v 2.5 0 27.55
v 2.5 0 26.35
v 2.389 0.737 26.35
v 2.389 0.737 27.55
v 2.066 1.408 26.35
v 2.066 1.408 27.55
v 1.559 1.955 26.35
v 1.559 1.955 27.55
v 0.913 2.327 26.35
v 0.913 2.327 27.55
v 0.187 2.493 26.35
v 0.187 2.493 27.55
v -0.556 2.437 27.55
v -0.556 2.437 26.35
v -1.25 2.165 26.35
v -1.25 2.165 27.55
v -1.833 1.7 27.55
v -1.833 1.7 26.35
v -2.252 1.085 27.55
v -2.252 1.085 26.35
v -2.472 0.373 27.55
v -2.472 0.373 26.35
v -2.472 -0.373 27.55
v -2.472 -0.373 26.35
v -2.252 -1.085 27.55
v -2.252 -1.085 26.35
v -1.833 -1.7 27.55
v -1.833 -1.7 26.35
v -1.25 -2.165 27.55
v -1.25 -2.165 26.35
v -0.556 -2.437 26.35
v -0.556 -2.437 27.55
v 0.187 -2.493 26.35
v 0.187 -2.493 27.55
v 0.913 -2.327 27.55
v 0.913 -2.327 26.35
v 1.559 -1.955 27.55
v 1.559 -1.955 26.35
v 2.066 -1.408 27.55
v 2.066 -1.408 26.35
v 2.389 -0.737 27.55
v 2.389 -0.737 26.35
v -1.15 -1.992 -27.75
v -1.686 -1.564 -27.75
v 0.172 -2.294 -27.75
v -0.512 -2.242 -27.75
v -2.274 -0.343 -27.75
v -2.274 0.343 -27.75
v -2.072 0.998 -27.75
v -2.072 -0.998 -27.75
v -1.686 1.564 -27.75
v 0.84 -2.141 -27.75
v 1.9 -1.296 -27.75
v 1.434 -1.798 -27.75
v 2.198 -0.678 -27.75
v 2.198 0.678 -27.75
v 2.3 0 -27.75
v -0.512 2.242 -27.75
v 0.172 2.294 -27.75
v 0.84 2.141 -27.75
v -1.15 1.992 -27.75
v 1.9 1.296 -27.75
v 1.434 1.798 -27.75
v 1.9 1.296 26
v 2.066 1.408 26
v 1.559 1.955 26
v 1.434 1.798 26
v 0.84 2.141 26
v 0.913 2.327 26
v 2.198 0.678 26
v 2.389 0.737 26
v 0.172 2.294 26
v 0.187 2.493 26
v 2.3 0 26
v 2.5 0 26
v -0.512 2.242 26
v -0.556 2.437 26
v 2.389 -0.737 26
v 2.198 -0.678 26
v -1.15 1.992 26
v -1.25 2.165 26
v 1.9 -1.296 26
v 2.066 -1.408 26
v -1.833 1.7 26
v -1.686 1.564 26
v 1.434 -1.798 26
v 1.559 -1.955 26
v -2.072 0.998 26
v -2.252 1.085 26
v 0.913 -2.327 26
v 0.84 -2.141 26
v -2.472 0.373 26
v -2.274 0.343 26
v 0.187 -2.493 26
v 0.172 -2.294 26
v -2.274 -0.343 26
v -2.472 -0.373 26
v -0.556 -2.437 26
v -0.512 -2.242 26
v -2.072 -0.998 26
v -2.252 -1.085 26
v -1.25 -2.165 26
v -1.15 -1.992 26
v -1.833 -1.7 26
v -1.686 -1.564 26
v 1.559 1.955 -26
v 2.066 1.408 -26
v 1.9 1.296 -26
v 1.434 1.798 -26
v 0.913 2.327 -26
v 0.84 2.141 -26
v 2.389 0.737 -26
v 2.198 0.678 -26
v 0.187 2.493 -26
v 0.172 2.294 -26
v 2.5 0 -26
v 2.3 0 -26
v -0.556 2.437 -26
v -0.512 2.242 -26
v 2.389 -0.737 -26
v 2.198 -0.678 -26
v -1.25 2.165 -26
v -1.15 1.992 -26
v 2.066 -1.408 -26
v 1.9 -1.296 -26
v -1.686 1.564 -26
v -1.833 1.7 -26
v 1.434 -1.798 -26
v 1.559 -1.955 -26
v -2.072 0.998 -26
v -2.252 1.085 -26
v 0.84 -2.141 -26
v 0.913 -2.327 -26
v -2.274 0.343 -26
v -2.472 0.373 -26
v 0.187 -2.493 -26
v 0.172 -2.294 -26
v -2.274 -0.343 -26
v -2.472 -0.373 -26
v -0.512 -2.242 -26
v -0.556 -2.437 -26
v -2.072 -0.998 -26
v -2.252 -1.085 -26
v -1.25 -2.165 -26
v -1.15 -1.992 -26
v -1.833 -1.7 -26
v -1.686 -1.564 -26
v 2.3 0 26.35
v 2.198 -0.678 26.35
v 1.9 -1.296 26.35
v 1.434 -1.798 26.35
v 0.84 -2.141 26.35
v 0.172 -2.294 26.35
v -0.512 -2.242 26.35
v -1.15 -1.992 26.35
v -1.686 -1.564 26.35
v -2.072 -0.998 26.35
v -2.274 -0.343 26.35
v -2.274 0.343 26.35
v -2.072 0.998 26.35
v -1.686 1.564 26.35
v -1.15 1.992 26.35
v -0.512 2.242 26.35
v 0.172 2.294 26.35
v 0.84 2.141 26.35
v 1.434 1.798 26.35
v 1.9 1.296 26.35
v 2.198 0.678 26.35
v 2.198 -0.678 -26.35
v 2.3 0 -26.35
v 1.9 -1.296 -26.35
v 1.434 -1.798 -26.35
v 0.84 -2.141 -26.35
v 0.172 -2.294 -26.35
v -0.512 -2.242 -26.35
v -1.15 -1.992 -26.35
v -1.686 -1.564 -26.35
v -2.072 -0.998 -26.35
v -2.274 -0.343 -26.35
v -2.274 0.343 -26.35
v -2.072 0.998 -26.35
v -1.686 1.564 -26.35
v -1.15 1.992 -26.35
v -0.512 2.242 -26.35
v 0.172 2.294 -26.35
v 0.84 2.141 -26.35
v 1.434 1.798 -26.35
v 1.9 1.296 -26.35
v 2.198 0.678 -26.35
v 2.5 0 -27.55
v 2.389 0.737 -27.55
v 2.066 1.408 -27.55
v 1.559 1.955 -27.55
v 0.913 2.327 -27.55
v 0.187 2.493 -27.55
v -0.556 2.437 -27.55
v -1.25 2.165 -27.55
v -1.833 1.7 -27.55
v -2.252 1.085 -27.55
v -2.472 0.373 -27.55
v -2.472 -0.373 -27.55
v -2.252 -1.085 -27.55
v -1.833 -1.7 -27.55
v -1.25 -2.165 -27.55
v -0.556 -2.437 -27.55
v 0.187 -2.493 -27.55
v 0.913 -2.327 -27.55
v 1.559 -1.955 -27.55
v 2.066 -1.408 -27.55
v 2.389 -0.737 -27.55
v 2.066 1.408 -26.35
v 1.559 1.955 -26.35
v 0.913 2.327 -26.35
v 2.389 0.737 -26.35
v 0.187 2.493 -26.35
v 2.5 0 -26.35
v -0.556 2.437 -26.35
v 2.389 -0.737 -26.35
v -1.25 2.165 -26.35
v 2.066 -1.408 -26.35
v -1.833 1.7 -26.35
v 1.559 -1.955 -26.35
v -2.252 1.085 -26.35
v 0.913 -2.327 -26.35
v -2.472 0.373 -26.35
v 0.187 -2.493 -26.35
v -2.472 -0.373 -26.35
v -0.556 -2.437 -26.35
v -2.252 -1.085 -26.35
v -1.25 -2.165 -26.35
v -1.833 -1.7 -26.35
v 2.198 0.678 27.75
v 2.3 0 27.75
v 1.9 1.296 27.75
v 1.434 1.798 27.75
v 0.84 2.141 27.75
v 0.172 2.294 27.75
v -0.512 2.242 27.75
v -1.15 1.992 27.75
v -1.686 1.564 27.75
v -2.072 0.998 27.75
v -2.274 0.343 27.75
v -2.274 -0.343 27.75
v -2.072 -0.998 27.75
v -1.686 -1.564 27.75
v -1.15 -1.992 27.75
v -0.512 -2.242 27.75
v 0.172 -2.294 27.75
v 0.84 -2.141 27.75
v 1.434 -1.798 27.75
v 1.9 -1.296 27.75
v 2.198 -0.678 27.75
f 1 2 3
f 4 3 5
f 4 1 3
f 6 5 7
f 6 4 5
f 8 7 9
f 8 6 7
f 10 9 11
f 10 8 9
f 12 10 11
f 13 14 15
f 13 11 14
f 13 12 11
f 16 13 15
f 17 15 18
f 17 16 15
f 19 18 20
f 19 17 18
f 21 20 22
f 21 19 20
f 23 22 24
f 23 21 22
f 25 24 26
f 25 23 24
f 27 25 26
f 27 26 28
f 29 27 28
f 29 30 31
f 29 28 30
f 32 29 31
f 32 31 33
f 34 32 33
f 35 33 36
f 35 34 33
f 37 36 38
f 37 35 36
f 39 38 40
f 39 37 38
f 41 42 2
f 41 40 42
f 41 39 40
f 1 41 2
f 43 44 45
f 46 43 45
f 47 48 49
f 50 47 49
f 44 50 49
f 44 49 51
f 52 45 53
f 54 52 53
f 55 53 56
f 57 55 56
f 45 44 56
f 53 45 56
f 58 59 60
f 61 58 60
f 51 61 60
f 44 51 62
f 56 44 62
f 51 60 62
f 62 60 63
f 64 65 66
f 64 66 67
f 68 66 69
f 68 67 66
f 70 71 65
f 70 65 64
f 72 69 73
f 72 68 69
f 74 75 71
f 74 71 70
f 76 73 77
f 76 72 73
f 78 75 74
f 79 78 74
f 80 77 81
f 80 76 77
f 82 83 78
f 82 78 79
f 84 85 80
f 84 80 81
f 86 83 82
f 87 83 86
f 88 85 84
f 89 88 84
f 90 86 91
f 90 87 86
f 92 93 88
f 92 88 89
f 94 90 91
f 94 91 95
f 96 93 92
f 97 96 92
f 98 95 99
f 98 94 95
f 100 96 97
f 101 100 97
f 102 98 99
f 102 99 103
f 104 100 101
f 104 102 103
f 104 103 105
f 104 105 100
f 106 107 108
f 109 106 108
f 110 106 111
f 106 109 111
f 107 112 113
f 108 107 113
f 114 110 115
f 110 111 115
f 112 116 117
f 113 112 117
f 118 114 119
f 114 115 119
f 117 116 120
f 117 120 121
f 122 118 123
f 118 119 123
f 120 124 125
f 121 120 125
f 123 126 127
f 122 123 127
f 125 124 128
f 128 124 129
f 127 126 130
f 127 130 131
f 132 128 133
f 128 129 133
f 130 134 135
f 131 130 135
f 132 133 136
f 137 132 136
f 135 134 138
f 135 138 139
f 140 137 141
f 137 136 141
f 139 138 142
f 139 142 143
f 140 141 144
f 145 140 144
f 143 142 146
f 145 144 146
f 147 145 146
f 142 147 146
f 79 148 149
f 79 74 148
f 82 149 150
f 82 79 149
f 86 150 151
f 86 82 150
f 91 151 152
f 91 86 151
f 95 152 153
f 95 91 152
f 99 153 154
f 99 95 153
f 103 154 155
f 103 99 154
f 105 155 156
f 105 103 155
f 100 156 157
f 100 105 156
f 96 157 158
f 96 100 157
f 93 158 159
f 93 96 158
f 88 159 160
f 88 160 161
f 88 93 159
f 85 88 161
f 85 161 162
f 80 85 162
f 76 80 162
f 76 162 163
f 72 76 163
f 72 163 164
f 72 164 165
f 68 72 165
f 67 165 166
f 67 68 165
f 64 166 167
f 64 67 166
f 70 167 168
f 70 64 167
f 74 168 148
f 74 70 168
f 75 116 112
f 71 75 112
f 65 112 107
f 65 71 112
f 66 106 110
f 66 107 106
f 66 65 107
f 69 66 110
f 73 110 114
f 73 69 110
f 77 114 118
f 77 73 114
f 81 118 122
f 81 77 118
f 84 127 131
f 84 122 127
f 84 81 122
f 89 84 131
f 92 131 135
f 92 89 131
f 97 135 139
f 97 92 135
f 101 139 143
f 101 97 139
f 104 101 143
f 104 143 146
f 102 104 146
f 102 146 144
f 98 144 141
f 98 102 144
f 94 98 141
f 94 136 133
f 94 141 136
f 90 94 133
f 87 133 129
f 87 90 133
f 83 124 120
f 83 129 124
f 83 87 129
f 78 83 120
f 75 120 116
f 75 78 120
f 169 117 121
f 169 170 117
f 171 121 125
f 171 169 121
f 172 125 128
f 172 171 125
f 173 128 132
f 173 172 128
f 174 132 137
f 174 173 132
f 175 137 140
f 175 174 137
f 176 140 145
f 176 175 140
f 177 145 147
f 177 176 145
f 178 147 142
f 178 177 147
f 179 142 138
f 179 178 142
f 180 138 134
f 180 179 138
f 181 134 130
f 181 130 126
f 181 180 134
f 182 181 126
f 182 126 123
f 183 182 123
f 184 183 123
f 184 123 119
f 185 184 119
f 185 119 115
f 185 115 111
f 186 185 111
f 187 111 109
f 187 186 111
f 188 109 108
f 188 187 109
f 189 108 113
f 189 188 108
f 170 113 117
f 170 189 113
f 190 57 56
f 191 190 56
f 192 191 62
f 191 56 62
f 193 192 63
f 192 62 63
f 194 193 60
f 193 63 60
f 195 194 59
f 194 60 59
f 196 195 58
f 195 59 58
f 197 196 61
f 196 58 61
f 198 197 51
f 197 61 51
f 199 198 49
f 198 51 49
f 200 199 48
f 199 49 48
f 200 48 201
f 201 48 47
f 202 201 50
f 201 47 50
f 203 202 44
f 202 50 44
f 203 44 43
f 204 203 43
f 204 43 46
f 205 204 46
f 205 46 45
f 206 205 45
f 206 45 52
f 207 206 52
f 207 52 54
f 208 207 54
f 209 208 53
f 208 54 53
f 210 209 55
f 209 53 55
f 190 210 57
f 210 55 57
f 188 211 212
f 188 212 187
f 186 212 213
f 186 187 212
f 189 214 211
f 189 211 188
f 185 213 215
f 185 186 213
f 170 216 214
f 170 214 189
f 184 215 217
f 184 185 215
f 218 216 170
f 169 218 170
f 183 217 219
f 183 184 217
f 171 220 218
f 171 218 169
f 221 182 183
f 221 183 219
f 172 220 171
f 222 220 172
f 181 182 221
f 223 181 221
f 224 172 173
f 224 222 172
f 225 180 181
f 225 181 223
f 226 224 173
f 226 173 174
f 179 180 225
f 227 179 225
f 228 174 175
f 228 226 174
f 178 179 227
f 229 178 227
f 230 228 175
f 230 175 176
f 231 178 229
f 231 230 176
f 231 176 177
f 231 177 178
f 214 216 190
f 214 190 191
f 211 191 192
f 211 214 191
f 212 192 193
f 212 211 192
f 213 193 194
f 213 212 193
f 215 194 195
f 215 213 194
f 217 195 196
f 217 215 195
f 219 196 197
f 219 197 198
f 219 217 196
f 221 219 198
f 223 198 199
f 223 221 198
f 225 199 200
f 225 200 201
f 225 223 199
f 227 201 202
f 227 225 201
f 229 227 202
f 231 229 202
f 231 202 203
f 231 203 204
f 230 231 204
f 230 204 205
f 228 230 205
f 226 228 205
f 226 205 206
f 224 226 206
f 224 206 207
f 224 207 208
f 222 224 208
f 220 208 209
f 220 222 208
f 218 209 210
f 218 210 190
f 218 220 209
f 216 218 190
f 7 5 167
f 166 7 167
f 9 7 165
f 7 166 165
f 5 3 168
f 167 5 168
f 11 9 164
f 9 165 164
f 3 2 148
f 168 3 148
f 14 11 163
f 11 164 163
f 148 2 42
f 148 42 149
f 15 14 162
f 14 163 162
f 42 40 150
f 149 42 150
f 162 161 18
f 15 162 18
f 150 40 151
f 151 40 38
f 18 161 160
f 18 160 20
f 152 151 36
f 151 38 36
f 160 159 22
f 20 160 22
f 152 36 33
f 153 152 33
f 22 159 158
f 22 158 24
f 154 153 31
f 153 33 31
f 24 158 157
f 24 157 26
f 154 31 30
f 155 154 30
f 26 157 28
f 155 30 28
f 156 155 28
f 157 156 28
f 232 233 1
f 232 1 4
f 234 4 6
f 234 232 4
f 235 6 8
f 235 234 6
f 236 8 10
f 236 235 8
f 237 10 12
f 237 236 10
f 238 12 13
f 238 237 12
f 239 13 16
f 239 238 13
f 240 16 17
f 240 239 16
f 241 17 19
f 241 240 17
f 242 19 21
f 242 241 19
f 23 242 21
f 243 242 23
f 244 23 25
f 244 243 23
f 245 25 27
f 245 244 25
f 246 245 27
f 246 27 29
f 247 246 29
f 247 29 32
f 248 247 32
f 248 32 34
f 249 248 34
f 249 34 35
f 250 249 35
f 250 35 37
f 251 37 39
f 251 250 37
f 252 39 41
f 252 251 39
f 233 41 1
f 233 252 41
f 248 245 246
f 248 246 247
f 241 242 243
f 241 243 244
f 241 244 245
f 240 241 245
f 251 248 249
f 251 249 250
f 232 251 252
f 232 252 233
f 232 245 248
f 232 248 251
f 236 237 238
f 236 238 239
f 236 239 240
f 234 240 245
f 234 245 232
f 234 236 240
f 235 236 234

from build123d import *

# Parameters (mm, degrees)
SKETCH_1_R      = 2.5
EXTRUDE_1_DEPTH = 27.75
SKETCH_2_W      = 0.35
SKETCH_2_H      = 0.2
CHAMFER_1_SIZE  = 0.2


with BuildPart() as part:
    # 草图1 → 凸台-拉伸1 (new, symmetric)
    with BuildSketch(Plane.XY):
        Circle(SKETCH_1_R)
    extrude(amount=EXTRUDE_1_DEPTH, both=True)

    # 草图2 → 切除-旋转1 (revolve, cut)
    with BuildSketch(Plane(origin=(0, 0, 0), x_dir=(0, 0, -1), z_dir=(1, 0, 0)), mode=Mode.PRIVATE) as cut_revolve_1_sk:
        with Locations((-26.175, 2.4)):
            Rectangle(SKETCH_2_W, SKETCH_2_H)
        with Locations((26.175, 2.4)):
            Rectangle(SKETCH_2_W, SKETCH_2_H)
    revolve(cut_revolve_1_sk.sketch.rotate(Axis((0, 0, 27.75), (0, 0, -1)), 90), axis=Axis((0, 0, 27.75), (0, 0, -1)), mode=Mode.SUBTRACT)

    # 倒角1
    chamfer_1_edges = [part.edges().sort_by_distance(p)[0] for p in [
        (-2.5, 0, -27.75),
        (-2.5, 0, 27.75),
    ]]
    chamfer(chamfer_1_edges, length=CHAMFER_1_SIZE)


solid = part.part
